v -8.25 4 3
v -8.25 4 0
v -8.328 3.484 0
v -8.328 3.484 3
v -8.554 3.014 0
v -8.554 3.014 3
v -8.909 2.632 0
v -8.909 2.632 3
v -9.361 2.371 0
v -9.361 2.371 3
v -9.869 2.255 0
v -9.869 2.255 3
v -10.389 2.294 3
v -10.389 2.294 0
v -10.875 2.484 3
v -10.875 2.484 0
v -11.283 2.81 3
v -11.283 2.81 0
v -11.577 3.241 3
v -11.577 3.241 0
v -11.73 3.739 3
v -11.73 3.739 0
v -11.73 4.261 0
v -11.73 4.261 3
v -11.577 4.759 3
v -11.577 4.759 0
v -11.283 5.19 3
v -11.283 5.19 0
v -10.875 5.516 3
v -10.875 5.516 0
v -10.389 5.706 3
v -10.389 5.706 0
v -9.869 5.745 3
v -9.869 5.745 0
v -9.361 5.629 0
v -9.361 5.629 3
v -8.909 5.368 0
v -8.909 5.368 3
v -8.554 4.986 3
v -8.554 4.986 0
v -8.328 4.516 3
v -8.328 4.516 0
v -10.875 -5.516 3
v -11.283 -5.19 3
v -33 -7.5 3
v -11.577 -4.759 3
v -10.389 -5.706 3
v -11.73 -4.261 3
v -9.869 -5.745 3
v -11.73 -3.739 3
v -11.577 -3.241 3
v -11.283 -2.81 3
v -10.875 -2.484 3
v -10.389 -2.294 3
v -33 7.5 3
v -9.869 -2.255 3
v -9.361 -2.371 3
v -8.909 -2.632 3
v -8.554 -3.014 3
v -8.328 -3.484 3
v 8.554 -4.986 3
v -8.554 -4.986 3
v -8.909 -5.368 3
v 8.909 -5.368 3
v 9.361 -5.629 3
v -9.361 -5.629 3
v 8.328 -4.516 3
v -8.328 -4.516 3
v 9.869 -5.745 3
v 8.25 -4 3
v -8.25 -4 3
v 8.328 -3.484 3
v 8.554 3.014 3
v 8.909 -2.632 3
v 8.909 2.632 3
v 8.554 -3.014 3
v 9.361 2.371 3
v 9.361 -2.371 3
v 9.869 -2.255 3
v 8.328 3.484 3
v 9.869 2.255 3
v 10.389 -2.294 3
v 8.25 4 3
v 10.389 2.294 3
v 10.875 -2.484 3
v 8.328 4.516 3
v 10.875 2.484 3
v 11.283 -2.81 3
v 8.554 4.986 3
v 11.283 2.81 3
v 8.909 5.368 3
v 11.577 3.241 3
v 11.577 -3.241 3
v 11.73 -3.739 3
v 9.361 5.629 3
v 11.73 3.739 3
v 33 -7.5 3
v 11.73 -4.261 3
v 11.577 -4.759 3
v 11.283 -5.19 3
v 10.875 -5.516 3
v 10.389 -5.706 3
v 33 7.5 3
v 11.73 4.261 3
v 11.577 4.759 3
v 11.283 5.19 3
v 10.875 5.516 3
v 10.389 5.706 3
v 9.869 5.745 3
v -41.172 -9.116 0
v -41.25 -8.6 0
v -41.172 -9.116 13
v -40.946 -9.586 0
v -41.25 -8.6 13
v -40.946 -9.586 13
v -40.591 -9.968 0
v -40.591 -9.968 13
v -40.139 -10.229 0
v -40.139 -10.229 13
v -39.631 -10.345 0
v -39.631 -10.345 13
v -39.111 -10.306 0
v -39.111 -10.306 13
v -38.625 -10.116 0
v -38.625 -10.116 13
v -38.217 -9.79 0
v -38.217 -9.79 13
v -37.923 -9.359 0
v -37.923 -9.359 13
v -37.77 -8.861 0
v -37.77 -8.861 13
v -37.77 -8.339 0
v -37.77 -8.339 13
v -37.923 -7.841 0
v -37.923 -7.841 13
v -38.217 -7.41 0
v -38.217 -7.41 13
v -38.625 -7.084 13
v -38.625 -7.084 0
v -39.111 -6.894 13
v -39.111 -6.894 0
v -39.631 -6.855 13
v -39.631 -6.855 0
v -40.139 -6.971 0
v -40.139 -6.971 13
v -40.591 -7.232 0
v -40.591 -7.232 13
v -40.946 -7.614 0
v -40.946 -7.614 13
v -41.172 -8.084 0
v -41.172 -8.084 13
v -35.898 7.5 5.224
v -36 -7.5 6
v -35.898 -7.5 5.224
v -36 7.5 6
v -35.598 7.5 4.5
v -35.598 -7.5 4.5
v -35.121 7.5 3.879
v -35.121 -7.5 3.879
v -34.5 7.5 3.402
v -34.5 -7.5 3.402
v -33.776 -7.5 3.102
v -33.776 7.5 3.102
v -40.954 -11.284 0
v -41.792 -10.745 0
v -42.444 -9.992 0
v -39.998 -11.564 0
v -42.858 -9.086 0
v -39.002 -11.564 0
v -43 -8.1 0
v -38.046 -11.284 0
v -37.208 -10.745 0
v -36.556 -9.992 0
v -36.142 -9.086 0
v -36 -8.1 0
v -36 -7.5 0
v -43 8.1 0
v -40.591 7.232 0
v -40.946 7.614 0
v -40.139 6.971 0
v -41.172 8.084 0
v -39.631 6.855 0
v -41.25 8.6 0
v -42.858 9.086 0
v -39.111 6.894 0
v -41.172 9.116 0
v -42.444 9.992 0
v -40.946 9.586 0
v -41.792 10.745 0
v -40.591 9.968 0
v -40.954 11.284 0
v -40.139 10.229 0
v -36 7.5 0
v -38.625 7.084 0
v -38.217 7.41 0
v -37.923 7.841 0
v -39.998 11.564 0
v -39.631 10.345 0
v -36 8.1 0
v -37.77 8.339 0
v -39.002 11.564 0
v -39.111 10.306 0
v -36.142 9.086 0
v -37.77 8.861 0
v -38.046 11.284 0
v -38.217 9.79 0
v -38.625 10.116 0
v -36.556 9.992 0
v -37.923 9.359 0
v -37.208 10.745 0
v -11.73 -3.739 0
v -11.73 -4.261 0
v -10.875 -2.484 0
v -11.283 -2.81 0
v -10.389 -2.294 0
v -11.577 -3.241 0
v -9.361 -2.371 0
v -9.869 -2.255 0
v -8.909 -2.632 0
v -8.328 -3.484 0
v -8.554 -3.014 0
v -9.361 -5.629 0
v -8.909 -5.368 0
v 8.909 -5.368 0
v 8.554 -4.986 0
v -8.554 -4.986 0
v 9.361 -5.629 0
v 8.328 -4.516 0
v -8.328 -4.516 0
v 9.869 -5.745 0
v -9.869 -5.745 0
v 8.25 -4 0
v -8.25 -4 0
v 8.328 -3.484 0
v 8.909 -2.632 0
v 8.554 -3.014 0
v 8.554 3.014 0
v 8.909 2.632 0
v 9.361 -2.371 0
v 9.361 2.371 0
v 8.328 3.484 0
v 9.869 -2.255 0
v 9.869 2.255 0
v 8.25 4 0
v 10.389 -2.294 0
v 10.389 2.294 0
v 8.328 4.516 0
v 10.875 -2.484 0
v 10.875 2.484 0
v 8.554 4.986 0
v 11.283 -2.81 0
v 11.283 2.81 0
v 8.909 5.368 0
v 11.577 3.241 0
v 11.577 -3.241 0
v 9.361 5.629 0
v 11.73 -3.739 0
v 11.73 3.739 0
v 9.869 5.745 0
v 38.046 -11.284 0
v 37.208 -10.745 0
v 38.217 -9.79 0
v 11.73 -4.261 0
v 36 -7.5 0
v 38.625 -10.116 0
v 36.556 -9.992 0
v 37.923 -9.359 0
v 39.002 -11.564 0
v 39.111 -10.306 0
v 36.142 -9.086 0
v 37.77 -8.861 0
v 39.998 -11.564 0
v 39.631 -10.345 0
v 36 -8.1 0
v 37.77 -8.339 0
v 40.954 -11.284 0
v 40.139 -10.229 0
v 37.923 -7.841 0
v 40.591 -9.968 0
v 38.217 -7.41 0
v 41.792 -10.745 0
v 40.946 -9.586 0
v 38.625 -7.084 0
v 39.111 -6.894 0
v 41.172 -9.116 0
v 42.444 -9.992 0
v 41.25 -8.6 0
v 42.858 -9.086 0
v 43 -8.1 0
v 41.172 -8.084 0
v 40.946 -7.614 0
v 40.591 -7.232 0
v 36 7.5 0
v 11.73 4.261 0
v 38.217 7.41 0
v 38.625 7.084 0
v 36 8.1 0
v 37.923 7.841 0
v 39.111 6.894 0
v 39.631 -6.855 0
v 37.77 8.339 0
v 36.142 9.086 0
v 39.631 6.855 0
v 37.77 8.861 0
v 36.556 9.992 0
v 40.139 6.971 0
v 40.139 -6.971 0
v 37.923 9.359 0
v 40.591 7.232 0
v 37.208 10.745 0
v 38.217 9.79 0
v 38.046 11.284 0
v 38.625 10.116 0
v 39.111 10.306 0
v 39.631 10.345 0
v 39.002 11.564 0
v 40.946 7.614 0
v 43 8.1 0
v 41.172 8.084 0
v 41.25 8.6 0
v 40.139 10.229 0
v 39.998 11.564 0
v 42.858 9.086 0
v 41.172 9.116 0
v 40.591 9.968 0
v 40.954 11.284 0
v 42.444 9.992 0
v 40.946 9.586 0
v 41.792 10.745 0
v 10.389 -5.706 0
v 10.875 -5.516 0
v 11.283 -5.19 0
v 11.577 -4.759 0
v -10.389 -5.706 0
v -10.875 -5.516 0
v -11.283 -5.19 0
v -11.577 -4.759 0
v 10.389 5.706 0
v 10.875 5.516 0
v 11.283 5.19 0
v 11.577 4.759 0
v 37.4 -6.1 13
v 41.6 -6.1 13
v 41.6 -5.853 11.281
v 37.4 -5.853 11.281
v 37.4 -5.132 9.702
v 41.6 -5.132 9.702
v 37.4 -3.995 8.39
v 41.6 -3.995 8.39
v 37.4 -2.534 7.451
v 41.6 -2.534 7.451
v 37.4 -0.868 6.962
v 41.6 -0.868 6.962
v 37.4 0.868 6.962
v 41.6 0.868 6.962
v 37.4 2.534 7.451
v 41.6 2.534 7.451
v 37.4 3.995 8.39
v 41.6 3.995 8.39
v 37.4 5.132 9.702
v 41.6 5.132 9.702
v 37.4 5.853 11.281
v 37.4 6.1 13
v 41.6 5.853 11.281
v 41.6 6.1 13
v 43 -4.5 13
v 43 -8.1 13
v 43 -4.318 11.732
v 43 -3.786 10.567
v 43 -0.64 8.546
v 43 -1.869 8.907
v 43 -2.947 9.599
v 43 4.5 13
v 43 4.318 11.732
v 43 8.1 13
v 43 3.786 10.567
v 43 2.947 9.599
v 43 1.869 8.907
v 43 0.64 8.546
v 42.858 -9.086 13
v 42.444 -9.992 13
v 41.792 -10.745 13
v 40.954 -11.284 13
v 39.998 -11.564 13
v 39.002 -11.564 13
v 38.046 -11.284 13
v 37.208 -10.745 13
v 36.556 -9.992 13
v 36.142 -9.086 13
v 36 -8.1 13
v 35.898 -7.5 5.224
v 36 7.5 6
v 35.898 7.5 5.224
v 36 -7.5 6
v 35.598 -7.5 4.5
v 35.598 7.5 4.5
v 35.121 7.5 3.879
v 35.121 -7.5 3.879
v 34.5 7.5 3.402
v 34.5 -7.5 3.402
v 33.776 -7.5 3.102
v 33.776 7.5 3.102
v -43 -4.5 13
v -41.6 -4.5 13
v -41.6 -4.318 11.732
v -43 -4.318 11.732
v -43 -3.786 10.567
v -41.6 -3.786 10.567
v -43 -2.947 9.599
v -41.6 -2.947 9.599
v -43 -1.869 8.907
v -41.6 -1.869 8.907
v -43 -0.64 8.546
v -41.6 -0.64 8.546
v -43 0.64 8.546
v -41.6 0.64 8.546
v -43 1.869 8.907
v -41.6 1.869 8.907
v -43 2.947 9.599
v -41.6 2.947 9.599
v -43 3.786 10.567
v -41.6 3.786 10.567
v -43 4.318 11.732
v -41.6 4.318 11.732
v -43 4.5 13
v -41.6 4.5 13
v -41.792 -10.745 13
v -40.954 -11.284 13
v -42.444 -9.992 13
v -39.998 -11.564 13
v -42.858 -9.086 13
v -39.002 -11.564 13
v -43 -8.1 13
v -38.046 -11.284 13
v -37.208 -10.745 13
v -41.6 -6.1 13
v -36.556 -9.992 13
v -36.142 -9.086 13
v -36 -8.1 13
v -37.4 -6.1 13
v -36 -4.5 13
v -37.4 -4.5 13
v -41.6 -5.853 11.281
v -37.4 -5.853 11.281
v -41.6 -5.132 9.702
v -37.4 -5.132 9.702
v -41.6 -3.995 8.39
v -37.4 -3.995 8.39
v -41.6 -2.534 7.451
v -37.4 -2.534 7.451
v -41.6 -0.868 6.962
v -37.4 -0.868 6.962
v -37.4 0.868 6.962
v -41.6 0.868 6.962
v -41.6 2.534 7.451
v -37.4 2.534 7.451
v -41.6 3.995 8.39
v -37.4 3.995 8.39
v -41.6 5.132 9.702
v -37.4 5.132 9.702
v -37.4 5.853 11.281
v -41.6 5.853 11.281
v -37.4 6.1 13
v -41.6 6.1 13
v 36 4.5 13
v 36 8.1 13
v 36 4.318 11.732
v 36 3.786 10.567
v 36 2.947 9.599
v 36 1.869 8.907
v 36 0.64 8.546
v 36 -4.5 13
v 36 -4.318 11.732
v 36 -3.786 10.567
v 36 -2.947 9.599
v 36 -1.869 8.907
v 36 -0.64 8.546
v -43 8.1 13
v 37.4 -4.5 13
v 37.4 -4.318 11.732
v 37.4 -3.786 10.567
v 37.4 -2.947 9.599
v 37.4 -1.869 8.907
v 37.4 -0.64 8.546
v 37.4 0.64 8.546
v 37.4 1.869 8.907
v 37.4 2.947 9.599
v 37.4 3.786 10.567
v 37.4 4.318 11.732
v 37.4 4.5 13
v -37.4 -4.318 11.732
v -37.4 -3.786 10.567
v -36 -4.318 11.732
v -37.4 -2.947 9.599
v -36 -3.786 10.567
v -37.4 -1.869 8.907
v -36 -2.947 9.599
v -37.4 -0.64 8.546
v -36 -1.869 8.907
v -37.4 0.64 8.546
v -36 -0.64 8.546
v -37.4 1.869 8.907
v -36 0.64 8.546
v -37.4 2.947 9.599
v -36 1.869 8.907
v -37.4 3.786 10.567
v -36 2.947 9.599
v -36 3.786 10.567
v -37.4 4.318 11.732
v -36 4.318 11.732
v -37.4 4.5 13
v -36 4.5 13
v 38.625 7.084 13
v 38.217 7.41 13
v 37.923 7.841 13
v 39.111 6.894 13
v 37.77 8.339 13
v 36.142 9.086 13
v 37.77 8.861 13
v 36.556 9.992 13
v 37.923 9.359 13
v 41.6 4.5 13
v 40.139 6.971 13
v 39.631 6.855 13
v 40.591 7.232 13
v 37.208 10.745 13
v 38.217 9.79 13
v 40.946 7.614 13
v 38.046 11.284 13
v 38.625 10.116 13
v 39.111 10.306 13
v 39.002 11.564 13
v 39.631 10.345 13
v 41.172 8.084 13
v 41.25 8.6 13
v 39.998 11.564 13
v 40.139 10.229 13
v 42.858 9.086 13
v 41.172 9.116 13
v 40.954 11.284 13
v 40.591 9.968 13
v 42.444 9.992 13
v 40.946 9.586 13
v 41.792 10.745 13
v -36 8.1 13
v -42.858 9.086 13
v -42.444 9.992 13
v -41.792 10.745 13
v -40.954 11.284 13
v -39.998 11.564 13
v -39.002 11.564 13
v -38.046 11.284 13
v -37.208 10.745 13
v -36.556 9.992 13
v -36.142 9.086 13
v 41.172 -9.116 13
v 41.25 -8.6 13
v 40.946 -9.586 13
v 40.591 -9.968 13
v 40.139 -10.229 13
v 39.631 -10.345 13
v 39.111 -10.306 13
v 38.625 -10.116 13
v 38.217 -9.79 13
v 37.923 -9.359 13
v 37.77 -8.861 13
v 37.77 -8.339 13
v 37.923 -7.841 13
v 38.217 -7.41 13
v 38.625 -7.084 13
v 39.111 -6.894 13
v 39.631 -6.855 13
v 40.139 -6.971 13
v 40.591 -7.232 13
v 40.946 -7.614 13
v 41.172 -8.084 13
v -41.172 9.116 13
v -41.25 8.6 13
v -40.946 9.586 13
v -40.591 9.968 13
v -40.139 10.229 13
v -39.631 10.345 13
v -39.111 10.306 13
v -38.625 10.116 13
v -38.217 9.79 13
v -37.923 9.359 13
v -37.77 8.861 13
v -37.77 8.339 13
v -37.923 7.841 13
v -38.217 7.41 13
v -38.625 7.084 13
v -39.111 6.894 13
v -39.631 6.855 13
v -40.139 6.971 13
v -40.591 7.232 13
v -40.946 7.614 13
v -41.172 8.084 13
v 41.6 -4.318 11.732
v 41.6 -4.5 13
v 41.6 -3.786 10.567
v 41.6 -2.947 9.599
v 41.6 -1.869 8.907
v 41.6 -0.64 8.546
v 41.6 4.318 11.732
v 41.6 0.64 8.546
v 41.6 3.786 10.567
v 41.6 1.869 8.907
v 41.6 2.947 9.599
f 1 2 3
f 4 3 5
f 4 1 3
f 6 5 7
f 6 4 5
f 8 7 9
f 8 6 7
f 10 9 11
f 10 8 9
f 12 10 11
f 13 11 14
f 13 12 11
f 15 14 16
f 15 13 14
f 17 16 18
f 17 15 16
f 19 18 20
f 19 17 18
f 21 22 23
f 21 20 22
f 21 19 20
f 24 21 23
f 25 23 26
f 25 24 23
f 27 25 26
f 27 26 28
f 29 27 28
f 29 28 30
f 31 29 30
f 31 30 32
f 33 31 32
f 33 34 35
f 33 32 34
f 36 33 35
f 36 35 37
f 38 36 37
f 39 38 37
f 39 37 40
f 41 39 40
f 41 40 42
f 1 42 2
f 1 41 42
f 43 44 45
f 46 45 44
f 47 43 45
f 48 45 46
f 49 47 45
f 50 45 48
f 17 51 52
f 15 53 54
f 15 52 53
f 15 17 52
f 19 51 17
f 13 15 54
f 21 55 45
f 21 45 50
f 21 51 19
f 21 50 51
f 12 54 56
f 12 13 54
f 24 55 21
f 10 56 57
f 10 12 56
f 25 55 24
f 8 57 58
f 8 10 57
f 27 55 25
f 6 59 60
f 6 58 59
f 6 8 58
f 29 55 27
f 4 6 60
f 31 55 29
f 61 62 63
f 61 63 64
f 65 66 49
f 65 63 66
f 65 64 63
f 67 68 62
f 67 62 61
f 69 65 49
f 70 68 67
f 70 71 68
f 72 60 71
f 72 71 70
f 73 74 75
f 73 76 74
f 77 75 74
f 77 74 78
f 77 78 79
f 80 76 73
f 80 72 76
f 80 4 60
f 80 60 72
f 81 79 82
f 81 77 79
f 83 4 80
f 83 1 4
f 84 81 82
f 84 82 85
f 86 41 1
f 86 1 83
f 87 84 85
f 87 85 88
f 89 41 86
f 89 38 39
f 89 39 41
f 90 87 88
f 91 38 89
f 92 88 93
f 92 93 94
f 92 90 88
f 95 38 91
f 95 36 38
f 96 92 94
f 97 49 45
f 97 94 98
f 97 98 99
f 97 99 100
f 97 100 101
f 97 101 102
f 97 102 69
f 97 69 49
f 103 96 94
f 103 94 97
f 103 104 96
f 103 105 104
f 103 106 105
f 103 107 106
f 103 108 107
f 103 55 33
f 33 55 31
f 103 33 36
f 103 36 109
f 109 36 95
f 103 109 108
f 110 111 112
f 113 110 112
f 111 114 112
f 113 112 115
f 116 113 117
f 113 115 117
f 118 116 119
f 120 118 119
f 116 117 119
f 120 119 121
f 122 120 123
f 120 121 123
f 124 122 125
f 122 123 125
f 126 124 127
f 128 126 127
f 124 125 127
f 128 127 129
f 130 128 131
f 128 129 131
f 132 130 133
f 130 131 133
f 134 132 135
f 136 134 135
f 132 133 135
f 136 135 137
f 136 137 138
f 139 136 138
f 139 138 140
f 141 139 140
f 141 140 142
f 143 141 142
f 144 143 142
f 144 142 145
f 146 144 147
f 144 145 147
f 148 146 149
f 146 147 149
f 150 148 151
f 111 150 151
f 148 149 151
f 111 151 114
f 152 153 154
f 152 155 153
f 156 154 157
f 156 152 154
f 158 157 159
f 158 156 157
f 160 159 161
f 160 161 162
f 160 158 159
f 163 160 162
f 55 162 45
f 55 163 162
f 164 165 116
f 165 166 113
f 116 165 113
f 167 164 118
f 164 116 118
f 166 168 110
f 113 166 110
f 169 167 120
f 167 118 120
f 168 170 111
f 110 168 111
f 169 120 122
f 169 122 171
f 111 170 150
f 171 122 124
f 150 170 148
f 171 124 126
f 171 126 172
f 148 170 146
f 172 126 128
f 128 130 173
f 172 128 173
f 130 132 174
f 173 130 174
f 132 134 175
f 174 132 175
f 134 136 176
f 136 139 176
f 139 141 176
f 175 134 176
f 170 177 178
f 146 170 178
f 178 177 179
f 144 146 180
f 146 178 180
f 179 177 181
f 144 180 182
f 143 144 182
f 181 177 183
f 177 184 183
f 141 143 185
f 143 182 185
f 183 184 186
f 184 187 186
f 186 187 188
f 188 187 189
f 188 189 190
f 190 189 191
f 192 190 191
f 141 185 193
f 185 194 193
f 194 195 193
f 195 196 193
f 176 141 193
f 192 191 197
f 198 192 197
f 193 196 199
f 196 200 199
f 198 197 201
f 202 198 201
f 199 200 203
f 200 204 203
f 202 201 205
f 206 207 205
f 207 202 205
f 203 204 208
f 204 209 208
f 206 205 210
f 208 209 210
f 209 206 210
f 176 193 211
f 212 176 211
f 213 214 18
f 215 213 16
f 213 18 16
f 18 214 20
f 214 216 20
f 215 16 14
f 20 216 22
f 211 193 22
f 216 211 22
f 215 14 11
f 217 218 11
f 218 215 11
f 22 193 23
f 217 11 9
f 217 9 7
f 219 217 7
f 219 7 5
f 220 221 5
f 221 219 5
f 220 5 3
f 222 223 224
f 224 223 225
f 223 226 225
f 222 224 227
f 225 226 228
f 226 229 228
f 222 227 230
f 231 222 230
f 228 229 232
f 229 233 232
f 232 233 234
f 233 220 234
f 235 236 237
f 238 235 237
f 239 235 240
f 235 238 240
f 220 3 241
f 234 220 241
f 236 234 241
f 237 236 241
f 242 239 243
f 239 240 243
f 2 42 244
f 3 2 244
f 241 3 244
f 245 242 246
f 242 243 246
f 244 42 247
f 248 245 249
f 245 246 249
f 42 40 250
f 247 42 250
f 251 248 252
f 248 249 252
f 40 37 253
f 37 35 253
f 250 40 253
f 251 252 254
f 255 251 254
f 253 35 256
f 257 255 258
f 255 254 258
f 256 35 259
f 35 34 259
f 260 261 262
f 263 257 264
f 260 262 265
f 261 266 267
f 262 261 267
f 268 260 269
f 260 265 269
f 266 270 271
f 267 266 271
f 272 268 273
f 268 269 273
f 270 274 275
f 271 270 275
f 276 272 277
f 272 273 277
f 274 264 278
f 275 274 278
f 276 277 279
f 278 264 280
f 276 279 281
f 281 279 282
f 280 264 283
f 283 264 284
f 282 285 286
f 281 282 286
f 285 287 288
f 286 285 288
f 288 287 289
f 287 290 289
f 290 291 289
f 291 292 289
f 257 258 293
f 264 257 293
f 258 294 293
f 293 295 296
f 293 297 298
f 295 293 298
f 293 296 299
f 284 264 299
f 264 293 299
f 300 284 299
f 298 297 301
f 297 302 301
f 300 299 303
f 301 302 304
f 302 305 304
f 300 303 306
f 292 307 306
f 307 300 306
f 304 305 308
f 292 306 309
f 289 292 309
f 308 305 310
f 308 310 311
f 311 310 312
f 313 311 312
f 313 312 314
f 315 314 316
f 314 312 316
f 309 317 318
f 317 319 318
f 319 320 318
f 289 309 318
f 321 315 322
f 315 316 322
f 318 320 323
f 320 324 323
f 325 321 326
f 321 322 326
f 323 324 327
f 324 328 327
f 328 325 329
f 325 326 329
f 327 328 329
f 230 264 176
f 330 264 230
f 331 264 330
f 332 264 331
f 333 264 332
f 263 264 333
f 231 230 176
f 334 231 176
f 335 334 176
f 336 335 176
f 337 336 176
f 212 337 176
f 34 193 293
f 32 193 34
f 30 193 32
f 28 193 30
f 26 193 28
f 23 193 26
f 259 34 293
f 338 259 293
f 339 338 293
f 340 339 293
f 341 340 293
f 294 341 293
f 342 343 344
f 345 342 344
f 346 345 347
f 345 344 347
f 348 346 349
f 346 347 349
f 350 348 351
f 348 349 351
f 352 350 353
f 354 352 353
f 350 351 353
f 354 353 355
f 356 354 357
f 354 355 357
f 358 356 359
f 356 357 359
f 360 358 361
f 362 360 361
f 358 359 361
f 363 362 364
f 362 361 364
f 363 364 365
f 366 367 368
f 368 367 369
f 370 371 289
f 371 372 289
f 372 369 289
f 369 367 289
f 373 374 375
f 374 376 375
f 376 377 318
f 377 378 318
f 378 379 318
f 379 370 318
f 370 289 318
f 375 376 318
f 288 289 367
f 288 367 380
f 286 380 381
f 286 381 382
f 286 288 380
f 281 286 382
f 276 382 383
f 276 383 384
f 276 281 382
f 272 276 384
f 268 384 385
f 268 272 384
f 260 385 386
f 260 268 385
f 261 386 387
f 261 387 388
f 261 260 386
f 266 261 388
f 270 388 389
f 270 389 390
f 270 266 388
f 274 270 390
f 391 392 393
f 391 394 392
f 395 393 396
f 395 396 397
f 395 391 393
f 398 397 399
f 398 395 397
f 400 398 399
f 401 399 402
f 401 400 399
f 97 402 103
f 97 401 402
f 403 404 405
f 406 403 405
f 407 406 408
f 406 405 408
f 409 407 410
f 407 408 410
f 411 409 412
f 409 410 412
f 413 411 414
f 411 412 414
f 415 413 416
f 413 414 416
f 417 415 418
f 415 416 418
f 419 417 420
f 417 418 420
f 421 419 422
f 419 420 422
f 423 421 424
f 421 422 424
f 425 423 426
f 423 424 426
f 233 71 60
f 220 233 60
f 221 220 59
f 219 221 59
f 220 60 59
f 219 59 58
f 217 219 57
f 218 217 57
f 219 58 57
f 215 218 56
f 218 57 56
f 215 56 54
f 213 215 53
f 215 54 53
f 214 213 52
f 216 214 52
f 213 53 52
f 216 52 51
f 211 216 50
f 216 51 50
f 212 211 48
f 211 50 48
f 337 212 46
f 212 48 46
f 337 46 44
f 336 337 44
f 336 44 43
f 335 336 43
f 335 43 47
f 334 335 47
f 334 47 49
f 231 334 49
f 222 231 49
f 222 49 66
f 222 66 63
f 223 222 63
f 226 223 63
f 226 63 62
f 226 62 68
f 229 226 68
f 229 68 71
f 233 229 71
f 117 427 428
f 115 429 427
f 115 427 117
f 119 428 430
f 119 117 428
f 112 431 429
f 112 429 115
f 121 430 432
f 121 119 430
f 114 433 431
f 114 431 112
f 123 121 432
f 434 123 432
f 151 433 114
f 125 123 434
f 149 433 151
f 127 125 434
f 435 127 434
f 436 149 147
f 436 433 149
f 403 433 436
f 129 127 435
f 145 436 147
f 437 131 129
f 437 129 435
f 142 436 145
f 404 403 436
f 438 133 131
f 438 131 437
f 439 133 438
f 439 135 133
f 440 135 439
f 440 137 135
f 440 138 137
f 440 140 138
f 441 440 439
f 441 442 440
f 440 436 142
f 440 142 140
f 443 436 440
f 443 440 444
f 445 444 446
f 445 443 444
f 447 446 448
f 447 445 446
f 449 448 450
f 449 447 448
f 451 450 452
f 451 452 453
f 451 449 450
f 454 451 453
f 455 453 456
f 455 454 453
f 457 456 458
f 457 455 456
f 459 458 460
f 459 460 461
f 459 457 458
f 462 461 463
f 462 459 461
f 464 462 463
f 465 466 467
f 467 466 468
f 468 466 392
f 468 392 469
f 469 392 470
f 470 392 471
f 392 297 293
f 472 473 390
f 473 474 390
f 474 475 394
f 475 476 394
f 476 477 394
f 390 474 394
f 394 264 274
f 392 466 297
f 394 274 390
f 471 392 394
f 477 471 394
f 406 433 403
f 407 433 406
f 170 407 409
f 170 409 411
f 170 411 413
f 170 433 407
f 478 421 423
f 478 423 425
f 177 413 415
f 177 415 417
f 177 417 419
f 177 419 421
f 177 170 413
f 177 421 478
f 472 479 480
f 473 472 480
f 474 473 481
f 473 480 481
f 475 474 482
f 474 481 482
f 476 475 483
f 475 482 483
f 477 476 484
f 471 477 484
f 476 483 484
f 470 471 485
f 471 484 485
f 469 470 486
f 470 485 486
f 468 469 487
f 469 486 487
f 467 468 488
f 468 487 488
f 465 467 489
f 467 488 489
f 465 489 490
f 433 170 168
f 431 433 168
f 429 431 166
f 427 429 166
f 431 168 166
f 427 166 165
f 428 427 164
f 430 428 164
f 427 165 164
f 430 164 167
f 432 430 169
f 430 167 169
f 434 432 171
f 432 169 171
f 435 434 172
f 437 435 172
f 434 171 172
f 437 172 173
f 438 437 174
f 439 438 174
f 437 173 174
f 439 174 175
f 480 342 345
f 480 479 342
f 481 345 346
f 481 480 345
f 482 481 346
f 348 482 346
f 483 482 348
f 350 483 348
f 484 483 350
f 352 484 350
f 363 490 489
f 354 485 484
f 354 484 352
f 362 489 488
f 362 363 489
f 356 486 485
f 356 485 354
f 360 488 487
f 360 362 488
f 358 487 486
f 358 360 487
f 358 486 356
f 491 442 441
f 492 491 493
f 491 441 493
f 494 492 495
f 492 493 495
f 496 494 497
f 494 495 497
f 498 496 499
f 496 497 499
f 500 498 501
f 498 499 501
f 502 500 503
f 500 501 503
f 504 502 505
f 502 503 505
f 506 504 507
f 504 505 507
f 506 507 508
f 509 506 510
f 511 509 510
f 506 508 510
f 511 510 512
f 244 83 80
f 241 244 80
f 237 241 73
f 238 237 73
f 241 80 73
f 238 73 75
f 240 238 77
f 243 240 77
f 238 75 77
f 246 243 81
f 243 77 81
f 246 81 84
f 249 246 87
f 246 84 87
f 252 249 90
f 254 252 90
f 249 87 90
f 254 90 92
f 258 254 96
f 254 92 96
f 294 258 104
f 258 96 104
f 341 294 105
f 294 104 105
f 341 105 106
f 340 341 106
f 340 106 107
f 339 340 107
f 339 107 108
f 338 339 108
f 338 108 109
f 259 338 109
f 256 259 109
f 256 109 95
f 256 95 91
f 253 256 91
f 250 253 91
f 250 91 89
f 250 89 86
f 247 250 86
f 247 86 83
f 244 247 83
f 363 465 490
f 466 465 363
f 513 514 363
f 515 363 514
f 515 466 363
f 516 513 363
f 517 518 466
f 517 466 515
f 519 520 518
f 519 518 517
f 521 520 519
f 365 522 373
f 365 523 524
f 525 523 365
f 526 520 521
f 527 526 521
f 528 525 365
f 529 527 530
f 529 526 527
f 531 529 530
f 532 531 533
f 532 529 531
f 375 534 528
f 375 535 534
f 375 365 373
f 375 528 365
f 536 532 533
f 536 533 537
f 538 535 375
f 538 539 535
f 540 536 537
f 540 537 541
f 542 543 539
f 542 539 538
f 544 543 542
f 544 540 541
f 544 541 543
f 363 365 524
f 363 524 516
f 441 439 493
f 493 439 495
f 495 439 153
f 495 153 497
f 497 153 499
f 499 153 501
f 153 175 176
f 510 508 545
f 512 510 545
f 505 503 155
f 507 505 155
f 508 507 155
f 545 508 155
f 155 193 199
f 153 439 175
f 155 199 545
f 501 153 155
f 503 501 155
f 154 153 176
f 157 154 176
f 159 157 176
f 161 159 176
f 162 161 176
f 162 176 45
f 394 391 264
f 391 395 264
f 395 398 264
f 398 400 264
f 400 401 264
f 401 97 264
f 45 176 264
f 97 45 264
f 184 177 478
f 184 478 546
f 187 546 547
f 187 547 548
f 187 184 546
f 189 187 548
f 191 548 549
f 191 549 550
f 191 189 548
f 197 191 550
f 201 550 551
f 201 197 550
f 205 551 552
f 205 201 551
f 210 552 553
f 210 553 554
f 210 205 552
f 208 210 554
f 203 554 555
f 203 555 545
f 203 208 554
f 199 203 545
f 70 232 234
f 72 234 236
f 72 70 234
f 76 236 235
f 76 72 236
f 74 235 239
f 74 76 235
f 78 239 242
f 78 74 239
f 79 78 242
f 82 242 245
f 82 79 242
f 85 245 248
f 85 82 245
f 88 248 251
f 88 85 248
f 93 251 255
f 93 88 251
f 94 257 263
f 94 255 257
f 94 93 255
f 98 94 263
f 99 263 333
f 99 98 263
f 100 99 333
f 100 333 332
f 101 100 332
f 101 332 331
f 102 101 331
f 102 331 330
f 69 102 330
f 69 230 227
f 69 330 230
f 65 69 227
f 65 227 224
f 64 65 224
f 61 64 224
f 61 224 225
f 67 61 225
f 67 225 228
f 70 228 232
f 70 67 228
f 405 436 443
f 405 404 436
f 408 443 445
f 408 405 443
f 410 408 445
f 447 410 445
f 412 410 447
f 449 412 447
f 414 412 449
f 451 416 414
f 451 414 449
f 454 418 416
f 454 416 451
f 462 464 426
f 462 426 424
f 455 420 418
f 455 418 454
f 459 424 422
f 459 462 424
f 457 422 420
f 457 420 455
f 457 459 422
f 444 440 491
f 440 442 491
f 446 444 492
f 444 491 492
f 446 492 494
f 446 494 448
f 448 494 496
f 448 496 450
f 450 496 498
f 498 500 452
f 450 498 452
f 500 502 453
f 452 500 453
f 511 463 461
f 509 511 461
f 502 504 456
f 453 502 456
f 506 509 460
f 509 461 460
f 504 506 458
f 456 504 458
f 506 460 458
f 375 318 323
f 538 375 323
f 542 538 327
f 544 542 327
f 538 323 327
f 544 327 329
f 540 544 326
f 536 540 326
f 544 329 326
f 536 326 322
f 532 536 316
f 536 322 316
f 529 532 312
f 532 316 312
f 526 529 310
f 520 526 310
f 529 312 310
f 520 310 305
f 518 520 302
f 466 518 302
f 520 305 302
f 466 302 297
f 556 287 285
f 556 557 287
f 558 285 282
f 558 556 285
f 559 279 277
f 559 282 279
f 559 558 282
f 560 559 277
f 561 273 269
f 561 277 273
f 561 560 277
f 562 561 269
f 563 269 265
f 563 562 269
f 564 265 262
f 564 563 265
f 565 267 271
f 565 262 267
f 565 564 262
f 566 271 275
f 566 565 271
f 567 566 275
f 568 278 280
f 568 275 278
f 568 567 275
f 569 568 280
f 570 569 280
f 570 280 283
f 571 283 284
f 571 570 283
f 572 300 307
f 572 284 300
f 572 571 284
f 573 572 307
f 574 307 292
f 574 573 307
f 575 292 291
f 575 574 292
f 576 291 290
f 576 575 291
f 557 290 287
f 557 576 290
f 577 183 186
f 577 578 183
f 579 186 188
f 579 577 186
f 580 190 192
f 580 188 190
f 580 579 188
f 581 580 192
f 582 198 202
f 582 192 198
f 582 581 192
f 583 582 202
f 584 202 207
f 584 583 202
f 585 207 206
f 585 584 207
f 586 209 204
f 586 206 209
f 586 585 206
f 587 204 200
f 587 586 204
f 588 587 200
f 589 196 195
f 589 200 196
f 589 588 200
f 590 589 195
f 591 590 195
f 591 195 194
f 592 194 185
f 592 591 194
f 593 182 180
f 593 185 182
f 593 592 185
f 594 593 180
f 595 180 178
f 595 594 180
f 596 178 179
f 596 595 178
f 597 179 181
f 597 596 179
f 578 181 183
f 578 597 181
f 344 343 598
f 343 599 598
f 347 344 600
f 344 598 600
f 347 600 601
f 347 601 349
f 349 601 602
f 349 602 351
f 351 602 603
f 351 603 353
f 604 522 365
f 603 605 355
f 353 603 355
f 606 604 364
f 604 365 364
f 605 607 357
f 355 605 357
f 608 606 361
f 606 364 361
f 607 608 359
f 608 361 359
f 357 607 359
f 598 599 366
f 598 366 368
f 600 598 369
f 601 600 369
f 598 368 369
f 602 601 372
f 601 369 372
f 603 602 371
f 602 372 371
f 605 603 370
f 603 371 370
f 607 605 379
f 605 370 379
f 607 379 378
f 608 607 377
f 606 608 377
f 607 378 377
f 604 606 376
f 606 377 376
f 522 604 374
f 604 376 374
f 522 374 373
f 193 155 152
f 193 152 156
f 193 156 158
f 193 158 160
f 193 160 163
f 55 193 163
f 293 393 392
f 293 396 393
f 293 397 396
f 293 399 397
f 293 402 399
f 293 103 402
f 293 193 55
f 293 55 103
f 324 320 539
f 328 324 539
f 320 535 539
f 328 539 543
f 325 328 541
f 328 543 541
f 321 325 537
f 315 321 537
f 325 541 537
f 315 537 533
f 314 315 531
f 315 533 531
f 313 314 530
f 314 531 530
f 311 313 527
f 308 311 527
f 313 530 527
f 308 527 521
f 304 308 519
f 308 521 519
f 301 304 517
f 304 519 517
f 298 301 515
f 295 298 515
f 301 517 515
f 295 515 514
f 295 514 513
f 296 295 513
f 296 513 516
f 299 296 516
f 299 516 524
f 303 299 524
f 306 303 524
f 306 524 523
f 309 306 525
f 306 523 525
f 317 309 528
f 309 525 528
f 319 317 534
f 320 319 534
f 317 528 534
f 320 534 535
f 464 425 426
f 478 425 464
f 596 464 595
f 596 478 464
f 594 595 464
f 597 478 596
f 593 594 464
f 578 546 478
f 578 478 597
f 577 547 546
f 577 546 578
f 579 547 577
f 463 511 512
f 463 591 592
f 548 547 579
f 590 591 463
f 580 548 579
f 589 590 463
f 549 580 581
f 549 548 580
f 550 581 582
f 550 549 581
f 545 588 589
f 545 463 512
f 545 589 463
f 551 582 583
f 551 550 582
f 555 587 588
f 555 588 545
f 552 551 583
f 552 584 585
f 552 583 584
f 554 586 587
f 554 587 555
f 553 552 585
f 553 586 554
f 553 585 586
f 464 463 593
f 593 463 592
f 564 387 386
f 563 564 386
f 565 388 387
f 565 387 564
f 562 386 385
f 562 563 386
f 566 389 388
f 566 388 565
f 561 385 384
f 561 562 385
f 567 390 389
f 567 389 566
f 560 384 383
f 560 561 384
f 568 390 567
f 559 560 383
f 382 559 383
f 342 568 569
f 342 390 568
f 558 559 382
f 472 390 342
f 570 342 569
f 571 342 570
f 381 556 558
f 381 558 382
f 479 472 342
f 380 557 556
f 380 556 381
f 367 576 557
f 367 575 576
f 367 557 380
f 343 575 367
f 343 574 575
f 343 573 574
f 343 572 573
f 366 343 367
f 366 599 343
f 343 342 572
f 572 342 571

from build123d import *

# Parameters (mm, degrees)
SKETCH1_W                                  = 86
SKETCH1_H                                  = 15
BOSS_EXTRUDE1_DEPTH                        = 3
SKETCH2_W                                  = 7
SKETCH2_H                                  = 15
BOSS_EXTRUDE2_DEPTH                        = 10
SKETCH5_R                                  = 4.5
CUT_EXTRUDE1_DEPTH                         = 88.299770905
SKETCH6_R                                  = 6.1
CUT_EXTRUDE4_DEPTH                         = 2.1
BOSS_EXTRUDE3_DEPTH                        = 13
SKETCH8_R                                  = 1.75
CUT_EXTRUDE5_DEPTH                         = 47.395689455
SKETCH9_R                                  = 1.75
CUT_EXTRUDE6_DEPTH                         = 46.6460294
MIRROR1_AT_THE_SECOND_PLANE_COPY_1_SKETC_R = 6.1
MIRROR1_AT_THE_SECOND_PLANE_COPY_1_DEPTH   = 2.1
MIRROR1_AT_THE_SECOND_PLANE_COPY_2_DEPTH   = 13
MIRROR1_AT_THE_SECOND_PLANE_COPY_3_SKETC_R = 1.75
MIRROR1_AT_THE_SECOND_PLANE_COPY_3_DEPTH   = 47.395689455
MIRROR1_AT_THE_SECOND_PLANE_COPY_4_SKETC_R = 1.75
MIRROR1_AT_THE_SECOND_PLANE_COPY_4_DEPTH   = 46.6460294
FILLET1_R                                  = 3


with BuildPart() as part:
    # Sketch1 → Boss-Extrude1 (new body)
    with BuildSketch(Plane.XY):
        Rectangle(SKETCH1_W, SKETCH1_H)
    extrude(amount=BOSS_EXTRUDE1_DEPTH)

    # Sketch2 → Boss-Extrude2 (add)
    with BuildSketch(Plane.XY.offset(3)):
        with Locations((-39.5, 0)):
            Rectangle(SKETCH2_W, SKETCH2_H)
        with Locations((39.5, 0)):
            Rectangle(SKETCH2_W, SKETCH2_H)
    extrude(amount=BOSS_EXTRUDE2_DEPTH)

    # Sketch5 → Cut-Extrude1 (cut, through all)
    with BuildSketch(Plane(origin=(43, 0, 0), x_dir=(0, 0, -1), z_dir=(1, 0, 0))):
        with Locations((-13, 0)):
            Circle(SKETCH5_R)
    extrude(amount=-CUT_EXTRUDE1_DEPTH, mode=Mode.SUBTRACT)

    # Sketch6 → Cut-Extrude4 (cut, symmetric)
    with BuildSketch(Plane(origin=(39.5, 0, 0), x_dir=(0, 0, -1), z_dir=(1, 0, 0))):
        with Locations((-13, 0)):
            Circle(SKETCH6_R)
    cut_extrude4 = extrude(amount=CUT_EXTRUDE4_DEPTH, both=True, mode=Mode.SUBTRACT)

    # Sketch7 → Boss-Extrude3 (add)
    with BuildSketch(Plane.XY):
        with BuildLine():
            Line((37.4, 6.1), (41.6, 6.1))
            Line((41.6, 6.1), (41.6, 4.5))
            Line((41.6, 4.5), (43, 4.5))
            Line((43, 4.5), (43, 8.1))
            ThreePointArc((43, 8.1), (39.5, 11.6), (36, 8.1))
            Line((36, 8.1), (36, 4.5))
            Line((36, 4.5), (37.4, 4.5))
            Line((37.4, 4.5), (37.4, 6.1))
        make_face()
    boss_extrude3 = extrude(amount=BOSS_EXTRUDE3_DEPTH)

    # Sketch8 → Cut-Extrude5 (cut, symmetric)
    with BuildSketch(Plane.XY.offset(13)):
        with Locations((39.5, 8.6)):
            Circle(SKETCH8_R)
    cut_extrude5 = extrude(amount=CUT_EXTRUDE5_DEPTH, both=True, mode=Mode.SUBTRACT)

    # Sketch9 → Cut-Extrude6 (cut, through all)
    with BuildSketch(Plane.XY.offset(3)):
        with Locations((-10, -4)):
            Circle(SKETCH9_R)
    cut_extrude6 = extrude(amount=-CUT_EXTRUDE6_DEPTH, mode=Mode.SUBTRACT)

    # Mirror1: Cut-Extrude4, Boss-Extrude3, Cut-Extrude5, Cut-Extrude6 across plane
    add(cut_extrude4.mirror(Plane(origin=(0, 0, 0), x_dir=(0, 0, 1), z_dir=(1, 0, 0))), mode=Mode.SUBTRACT)
    add(boss_extrude3.mirror(Plane(origin=(0, 0, 0), x_dir=(0, 0, 1), z_dir=(1, 0, 0))))
    add(cut_extrude5.mirror(Plane(origin=(0, 0, 0), x_dir=(0, 0, 1), z_dir=(1, 0, 0))), mode=Mode.SUBTRACT)
    add(cut_extrude6.mirror(Plane(origin=(0, 0, 0), x_dir=(0, 0, 1), z_dir=(1, 0, 0))), mode=Mode.SUBTRACT)

    # Mirror1 at the second plane: Cut-Extrude4, Boss-Extrude3, Cut-Extrude5, Cut-Extrude6 across plane
    add(cut_extrude4.mirror(Plane.ZX), mode=Mode.SUBTRACT)
    add(boss_extrude3.mirror(Plane.ZX))
    add(cut_extrude5.mirror(Plane.ZX), mode=Mode.SUBTRACT)
    add(cut_extrude6.mirror(Plane.ZX), mode=Mode.SUBTRACT)

    # Mirror1 at the second plane copy 1 sketc → Mirror1 at the second plane copy 1 (cut, symmetric)
    with BuildSketch(Plane(origin=(-39.5, 0, 0), x_dir=(0, 0, -1), z_dir=(-1, 0, 0))):
        with Locations((-13, 0)):
            Circle(MIRROR1_AT_THE_SECOND_PLANE_COPY_1_SKETC_R)
    extrude(amount=MIRROR1_AT_THE_SECOND_PLANE_COPY_1_DEPTH, both=True, mode=Mode.SUBTRACT)

    # Mirror1 at the second plane copy 2 sketc → Mirror1 at the second plane copy 2 (add)
    with BuildSketch(Plane(origin=(0, 0, 0), x_dir=(-1, 0, 0), z_dir=(0, 0, 1))):
        with BuildLine():
            Line((37.4, 6.1), (41.6, 6.1))
            Line((41.6, 6.1), (41.6, 4.5))
            Line((41.6, 4.5), (43, 4.5))
            Line((43, 4.5), (43, 8.1))
            ThreePointArc((43, 8.1), (39.5, 11.6), (36, 8.1))
            Line((36, 8.1), (36, 4.5))
            Line((36, 4.5), (37.4, 4.5))
            Line((37.4, 4.5), (37.4, 6.1))
        make_face()
    extrude(amount=MIRROR1_AT_THE_SECOND_PLANE_COPY_2_DEPTH)

    # Mirror1 at the second plane copy 3 sketc → Mirror1 at the second plane copy 3 (cut, symmetric)
    with BuildSketch(Plane(origin=(0, 0, 13), x_dir=(-1, 0, 0), z_dir=(0, 0, 1))):
        with Locations((39.5, 8.6)):
            Circle(MIRROR1_AT_THE_SECOND_PLANE_COPY_3_SKETC_R)
    extrude(amount=MIRROR1_AT_THE_SECOND_PLANE_COPY_3_DEPTH, both=True, mode=Mode.SUBTRACT)

    # Mirror1 at the second plane copy 4 sketc → Mirror1 at the second plane copy 4 (cut, through all)
    with BuildSketch(Plane(origin=(0, 0, 3), x_dir=(-1, 0, 0), z_dir=(0, 0, 1))):
        with Locations((-10, -4)):
            Circle(MIRROR1_AT_THE_SECOND_PLANE_COPY_4_SKETC_R)
    extrude(amount=-MIRROR1_AT_THE_SECOND_PLANE_COPY_4_DEPTH, mode=Mode.SUBTRACT)

    # Fillet1
    fillet1_edges = [part.edges().sort_by_distance(p)[0] for p in [
        (-36, 0, 3),
        (36, 0, 3),
    ]]
    fillet(fillet1_edges, radius=FILLET1_R)


solid = part.part
